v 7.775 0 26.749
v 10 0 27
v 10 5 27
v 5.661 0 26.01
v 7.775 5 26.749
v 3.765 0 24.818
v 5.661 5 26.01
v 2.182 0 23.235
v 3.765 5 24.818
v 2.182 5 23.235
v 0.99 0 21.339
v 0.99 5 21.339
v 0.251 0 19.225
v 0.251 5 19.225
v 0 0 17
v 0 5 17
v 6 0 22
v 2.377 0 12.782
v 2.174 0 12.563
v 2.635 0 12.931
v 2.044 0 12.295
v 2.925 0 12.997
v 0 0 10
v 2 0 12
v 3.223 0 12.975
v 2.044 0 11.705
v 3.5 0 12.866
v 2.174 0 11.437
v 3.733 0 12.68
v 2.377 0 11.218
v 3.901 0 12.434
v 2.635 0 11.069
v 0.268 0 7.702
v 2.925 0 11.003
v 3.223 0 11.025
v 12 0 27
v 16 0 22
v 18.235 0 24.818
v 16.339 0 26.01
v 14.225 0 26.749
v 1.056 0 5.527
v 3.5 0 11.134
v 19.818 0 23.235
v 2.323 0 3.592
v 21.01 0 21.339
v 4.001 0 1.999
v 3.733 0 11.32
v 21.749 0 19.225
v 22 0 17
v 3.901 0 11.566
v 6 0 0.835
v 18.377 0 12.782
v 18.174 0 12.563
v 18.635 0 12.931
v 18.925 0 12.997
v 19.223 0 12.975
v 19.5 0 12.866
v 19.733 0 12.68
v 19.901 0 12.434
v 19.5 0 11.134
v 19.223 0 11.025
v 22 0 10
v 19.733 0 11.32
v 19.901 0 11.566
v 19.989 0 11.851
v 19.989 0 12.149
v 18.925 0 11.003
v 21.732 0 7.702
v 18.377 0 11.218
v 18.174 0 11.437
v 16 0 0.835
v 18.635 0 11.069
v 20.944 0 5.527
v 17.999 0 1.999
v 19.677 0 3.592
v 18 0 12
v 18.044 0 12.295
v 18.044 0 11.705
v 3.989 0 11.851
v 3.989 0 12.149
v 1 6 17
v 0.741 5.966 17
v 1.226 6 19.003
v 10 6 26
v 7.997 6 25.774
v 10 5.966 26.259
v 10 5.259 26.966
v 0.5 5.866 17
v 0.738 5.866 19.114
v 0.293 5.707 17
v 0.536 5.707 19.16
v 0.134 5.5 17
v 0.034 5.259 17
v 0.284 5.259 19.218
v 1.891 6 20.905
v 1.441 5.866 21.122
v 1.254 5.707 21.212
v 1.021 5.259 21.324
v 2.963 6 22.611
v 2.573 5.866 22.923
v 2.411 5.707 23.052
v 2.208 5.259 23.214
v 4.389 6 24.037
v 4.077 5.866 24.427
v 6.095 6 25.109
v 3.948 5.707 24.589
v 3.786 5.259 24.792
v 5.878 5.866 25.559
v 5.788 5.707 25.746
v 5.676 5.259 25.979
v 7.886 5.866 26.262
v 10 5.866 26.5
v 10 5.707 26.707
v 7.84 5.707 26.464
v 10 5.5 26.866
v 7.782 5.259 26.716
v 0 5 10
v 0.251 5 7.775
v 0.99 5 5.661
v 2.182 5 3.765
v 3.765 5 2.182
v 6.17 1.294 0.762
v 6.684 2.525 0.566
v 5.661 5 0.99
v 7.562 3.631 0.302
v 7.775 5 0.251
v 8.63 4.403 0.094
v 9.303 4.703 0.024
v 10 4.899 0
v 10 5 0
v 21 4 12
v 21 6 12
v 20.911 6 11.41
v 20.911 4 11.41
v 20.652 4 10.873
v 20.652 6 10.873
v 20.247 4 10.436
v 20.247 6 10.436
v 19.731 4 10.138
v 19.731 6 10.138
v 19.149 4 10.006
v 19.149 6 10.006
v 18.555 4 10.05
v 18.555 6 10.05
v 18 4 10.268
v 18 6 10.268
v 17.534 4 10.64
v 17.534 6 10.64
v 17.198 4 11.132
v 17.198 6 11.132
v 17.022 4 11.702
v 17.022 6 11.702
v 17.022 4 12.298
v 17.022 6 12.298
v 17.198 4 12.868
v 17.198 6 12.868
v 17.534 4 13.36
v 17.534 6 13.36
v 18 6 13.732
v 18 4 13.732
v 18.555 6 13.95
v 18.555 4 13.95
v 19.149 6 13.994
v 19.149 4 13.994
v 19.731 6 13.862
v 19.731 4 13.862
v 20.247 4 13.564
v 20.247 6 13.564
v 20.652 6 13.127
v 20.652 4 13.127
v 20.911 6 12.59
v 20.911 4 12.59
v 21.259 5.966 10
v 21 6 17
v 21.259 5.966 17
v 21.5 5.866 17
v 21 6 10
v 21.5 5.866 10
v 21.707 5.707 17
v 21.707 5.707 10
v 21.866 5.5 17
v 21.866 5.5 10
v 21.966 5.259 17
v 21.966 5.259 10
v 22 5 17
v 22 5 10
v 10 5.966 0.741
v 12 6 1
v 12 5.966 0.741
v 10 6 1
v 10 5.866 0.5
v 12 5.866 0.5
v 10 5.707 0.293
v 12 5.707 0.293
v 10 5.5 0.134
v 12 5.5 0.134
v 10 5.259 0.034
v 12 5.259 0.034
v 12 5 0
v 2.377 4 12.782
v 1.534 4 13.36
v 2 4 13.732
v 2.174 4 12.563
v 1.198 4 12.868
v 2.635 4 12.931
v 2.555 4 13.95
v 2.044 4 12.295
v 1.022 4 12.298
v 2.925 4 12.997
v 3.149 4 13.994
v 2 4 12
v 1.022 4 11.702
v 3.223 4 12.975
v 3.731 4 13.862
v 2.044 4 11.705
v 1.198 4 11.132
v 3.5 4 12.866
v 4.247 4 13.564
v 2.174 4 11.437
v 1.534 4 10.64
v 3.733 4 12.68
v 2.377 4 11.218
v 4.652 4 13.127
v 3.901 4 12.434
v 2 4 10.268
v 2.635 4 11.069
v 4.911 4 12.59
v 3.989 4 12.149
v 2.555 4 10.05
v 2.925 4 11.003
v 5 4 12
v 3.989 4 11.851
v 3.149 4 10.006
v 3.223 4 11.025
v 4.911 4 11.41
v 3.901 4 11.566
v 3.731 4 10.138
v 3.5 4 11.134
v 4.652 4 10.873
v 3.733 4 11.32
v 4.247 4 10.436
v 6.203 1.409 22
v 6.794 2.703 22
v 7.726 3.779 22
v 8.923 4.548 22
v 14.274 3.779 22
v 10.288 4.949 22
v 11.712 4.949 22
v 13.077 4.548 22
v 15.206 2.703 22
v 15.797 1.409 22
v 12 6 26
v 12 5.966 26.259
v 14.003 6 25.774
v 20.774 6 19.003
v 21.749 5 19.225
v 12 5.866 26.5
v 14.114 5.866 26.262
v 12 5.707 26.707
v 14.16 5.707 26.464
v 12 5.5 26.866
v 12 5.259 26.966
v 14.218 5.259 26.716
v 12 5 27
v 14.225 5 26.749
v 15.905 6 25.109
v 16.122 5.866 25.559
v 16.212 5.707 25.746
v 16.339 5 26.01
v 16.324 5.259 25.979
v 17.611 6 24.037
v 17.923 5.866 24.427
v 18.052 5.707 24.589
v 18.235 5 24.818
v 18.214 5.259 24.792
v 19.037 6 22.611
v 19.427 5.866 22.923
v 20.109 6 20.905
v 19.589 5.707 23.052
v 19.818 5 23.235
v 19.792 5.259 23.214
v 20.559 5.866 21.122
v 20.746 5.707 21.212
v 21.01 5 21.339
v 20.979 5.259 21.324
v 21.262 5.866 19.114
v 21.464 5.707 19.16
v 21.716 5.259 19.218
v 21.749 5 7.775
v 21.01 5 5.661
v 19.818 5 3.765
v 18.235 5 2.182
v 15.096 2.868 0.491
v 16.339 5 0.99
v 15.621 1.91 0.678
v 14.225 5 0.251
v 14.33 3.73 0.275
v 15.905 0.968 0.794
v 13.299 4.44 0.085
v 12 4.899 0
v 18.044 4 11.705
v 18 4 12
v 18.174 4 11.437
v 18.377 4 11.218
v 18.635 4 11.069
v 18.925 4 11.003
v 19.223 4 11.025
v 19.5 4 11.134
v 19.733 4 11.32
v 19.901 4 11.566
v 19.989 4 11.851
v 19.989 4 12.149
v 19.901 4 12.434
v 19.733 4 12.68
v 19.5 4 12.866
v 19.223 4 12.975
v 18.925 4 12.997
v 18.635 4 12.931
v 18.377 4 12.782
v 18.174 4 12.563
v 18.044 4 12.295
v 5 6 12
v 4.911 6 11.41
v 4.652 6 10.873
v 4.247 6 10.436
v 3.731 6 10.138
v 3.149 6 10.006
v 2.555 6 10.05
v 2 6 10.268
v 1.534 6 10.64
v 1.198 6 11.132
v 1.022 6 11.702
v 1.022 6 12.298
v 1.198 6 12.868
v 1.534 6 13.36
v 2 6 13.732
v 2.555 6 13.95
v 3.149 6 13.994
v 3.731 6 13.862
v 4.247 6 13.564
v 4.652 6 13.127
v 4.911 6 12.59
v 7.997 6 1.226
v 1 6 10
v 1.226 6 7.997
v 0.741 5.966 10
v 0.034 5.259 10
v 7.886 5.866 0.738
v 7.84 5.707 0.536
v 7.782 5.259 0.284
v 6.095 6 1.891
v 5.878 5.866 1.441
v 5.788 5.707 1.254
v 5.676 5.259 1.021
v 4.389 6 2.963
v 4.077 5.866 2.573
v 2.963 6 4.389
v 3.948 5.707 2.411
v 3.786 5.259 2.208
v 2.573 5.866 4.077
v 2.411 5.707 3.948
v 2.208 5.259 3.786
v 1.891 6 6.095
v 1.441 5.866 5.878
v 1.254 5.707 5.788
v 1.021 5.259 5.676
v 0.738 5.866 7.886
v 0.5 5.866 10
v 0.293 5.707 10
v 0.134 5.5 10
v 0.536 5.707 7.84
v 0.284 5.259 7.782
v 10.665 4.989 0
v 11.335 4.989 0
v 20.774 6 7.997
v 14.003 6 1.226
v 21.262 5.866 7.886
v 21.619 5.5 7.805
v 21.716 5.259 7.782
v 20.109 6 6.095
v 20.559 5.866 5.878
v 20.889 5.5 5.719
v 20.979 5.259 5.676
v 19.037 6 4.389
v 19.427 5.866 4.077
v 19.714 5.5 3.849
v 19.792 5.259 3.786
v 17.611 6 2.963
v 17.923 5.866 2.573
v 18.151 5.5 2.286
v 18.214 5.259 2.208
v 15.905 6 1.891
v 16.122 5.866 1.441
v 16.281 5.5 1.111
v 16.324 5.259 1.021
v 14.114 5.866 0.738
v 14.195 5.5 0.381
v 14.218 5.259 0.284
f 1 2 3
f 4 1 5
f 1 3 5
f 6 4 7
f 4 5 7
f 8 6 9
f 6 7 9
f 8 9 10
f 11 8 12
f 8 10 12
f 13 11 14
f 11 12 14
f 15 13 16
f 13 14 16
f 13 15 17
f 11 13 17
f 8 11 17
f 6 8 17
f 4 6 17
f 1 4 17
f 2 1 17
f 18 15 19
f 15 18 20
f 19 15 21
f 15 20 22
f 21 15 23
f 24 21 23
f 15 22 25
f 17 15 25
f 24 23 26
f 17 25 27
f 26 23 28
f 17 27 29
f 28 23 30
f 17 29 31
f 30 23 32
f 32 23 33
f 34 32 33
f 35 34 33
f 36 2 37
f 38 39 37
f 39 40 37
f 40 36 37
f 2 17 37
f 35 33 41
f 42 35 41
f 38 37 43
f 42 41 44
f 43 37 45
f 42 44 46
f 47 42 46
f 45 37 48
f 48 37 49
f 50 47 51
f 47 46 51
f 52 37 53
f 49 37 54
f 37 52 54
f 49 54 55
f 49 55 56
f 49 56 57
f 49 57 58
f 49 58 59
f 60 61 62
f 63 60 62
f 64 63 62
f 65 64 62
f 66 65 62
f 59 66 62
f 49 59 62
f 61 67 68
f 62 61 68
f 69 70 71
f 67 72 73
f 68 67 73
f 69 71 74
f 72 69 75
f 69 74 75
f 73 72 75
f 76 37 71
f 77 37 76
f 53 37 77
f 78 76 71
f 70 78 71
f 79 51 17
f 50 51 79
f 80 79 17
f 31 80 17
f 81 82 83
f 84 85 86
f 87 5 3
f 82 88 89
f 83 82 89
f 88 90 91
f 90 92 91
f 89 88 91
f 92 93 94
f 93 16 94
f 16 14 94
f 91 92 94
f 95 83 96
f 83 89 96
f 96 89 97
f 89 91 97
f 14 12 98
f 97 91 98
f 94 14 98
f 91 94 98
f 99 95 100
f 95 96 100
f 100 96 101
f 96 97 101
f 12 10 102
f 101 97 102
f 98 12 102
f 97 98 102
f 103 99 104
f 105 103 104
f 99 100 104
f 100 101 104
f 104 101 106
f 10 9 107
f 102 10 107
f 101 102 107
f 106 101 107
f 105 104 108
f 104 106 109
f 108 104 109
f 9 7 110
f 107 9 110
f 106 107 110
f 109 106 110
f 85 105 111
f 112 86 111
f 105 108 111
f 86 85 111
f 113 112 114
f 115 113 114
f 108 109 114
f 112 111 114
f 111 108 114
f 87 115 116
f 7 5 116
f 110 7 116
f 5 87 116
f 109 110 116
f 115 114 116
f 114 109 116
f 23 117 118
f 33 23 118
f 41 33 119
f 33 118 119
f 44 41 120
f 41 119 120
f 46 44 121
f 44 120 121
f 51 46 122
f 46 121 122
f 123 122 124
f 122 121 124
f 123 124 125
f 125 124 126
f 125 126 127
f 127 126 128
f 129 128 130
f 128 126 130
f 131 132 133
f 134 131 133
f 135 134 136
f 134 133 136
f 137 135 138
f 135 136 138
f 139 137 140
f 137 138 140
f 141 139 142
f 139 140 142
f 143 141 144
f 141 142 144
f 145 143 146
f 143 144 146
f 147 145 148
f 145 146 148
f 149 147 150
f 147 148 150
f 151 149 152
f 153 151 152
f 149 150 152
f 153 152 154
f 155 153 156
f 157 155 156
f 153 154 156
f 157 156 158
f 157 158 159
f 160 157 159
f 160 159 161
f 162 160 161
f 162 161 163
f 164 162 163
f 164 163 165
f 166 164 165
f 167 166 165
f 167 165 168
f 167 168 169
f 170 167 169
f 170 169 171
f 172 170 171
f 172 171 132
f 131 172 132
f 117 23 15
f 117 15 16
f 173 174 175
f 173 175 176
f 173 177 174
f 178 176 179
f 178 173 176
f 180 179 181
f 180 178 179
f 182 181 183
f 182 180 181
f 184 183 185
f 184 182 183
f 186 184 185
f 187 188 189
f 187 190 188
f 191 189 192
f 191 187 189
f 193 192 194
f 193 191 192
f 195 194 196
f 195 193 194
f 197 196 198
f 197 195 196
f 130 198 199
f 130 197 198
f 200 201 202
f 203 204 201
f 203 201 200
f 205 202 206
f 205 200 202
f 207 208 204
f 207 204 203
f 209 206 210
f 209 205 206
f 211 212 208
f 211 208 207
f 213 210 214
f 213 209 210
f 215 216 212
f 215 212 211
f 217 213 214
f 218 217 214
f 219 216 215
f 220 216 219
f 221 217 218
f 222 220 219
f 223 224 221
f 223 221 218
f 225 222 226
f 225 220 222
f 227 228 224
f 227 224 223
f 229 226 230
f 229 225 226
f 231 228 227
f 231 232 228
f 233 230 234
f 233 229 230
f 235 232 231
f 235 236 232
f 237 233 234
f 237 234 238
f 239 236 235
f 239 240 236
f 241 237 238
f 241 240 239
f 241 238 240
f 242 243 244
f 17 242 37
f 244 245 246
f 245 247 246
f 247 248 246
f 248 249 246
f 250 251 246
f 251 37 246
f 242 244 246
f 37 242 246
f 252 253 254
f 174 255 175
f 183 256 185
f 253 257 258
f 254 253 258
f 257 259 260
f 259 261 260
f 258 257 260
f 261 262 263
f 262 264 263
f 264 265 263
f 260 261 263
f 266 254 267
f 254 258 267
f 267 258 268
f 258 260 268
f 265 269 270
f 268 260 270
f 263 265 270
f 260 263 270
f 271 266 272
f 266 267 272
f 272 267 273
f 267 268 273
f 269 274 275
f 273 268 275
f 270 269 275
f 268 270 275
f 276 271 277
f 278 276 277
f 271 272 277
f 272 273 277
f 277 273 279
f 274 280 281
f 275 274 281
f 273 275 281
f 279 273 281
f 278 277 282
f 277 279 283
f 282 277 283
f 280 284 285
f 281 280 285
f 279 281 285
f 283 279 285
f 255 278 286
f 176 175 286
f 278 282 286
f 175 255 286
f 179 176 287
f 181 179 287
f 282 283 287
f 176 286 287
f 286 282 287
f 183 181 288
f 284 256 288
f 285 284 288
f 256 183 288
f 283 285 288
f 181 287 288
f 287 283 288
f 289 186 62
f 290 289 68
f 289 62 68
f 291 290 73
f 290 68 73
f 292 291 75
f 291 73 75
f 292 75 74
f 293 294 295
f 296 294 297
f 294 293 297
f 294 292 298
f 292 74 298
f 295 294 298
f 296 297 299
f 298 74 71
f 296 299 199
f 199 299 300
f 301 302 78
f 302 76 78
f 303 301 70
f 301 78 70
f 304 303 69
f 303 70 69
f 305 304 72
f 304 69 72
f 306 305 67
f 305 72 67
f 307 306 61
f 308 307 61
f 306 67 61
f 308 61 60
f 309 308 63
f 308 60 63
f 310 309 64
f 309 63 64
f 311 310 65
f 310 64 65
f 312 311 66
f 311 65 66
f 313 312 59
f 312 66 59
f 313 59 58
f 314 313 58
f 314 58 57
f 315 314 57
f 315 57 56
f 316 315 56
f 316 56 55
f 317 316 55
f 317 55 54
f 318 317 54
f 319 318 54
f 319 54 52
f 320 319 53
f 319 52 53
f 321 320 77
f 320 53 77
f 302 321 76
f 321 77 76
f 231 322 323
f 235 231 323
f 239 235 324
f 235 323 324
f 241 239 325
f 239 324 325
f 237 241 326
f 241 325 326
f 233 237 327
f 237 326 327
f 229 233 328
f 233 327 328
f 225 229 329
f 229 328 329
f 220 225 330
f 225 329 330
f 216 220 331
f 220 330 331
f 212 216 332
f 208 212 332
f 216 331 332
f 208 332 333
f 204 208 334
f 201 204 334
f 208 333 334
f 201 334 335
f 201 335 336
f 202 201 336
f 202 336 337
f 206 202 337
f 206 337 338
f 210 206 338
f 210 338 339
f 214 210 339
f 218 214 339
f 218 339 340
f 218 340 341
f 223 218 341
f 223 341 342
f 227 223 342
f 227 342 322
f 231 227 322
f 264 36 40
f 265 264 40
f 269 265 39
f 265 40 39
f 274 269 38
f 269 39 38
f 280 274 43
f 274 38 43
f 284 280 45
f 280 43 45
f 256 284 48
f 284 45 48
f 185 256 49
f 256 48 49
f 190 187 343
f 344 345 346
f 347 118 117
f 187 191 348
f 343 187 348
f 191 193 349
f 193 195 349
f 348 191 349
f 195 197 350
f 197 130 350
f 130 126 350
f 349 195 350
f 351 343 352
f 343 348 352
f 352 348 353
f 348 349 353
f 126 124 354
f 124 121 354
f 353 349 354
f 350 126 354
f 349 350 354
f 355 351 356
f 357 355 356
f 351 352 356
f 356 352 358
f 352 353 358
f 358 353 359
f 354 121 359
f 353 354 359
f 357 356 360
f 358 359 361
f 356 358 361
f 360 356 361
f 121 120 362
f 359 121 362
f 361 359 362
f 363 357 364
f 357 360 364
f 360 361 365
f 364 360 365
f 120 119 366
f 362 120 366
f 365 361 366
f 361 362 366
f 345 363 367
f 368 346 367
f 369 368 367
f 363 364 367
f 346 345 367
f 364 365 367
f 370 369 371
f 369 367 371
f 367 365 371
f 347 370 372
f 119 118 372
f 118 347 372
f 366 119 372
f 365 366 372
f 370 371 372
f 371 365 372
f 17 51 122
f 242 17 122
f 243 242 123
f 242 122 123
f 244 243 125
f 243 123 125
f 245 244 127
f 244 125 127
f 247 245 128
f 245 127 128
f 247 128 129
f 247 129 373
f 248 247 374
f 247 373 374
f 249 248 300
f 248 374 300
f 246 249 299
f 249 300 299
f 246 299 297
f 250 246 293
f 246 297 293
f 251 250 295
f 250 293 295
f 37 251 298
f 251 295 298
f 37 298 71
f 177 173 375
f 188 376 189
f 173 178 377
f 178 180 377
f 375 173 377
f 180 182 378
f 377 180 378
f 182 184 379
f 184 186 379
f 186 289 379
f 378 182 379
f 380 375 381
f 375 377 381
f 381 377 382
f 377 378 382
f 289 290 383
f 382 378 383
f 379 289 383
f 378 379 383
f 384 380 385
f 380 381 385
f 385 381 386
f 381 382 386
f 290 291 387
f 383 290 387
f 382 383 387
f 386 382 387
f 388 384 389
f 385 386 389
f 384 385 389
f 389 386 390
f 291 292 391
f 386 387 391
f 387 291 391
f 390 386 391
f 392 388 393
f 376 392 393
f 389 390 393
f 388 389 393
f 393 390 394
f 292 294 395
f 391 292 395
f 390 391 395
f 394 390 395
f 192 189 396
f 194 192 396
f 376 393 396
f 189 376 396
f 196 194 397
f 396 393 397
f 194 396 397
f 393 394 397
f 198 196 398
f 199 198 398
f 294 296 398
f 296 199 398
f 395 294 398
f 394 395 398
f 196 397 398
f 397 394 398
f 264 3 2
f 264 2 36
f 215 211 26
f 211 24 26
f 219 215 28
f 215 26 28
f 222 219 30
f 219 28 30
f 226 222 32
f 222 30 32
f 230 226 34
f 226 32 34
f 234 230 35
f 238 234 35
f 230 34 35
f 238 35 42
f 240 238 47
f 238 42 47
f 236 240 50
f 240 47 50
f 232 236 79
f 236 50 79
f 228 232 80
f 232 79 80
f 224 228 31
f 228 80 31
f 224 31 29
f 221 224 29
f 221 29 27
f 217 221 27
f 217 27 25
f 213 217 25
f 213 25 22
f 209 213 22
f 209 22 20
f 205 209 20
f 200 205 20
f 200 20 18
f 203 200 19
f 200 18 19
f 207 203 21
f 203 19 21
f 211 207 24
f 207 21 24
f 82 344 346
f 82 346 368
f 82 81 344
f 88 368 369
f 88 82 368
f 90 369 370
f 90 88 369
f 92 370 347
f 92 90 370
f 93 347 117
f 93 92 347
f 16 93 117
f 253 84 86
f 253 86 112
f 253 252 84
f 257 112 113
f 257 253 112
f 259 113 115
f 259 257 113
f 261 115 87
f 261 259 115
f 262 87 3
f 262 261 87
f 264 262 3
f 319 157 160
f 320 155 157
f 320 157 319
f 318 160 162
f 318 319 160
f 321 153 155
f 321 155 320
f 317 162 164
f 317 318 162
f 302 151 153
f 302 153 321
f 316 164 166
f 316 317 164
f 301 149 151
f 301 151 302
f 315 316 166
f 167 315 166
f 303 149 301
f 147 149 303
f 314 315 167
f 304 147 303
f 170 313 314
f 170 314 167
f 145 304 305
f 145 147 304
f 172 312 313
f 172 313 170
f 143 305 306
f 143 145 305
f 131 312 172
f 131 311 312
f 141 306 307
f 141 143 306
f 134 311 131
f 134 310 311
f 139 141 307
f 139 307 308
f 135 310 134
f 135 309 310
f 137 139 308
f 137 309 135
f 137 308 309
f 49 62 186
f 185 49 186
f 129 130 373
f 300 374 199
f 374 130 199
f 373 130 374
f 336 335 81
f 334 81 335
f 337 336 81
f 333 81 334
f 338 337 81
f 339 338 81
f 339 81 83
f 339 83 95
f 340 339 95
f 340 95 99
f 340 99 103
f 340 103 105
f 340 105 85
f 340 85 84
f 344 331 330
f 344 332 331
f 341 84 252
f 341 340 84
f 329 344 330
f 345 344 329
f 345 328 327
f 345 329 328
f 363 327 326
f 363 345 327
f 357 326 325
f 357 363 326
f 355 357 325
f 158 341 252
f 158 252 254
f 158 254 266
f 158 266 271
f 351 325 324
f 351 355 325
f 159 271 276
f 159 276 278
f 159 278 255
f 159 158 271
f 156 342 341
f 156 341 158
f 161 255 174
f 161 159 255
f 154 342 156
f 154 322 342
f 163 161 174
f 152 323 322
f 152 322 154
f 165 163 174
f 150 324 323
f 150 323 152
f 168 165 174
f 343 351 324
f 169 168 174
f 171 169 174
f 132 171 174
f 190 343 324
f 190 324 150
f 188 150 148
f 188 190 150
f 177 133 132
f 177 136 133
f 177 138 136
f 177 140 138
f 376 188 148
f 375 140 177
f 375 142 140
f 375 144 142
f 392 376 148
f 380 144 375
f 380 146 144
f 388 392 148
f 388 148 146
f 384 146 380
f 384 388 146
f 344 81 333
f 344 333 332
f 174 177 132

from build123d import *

# Parameters (mm, degrees)
BOSS_EXTRU_1_DEPTH                                 = 22
ESQUISSE2_W                                        = 22
ESQUISSE2_H                                        = 6
BOSS_EXTRU_2_DEPTH                                 = 5
CHAMBRAGE_POUR_VIS_T_TE_HEXAGONALE_M21_D           = 2
CHAMBRAGE_POUR_VIS_T_TE_HEXAGONALE_M21_CBORE_D     = 4
CHAMBRAGE_POUR_VIS_T_TE_HEXAGONALE_M21_CBORE_DEPTH = 2
CONG_1_R                                           = 10
CONG_2_R                                           = 1


# Some blends are built 0.0001 mm under size
with BuildPart() as part:
    # Esquisse1 → Boss.-Extru.1 (new body)
    with BuildSketch(Plane.XY):
        with BuildLine():
            Line((0, 6), (0, 0))
            Line((0, 0), (6, 0))
            ThreePointArc((6, 0), (11, 5), (16, 0))
            Line((16, 0), (22, 0))
            Line((22, 0), (22, 6))
            Line((22, 6), (0, 6))
        make_face()
    extrude(amount=BOSS_EXTRU_1_DEPTH)

    # Esquisse2 → Boss.-Extru.2 (add)
    with BuildSketch(Plane.XY.offset(22)):
        with Locations((11, 3)):
            Rectangle(ESQUISSE2_W, ESQUISSE2_H)
    extrude(amount=BOSS_EXTRU_2_DEPTH)

    # Chambrage pour vis à tête hexagonale M21 (through all)
    with Locations(Plane(origin=(0, 6, 0), x_dir=(1, 0, 0), z_dir=(0, 1, 0))):
        with Locations((19, -12), (3, -12)):
            CounterBoreHole(CHAMBRAGE_POUR_VIS_T_TE_HEXAGONALE_M21_D / 2, CHAMBRAGE_POUR_VIS_T_TE_HEXAGONALE_M21_CBORE_D / 2, CHAMBRAGE_POUR_VIS_T_TE_HEXAGONALE_M21_CBORE_DEPTH)

    # Congé1
    # the kernel refuses this fillet: 10 mm, written as the material it takes off along each edge
    with BuildSketch(Plane(origin=(0, 31, 0), x_dir=(0, 0, 1), z_dir=(0, -1, 0)), Plane(origin=(22, -25, 27), x_dir=(-1, 0, 0), z_dir=(0, 1, 0))) as cong_1_piece_1:
        with BuildLine():
            CenterArc((CONG_1_R, -CONG_1_R), CONG_1_R, 90, 90)
            Line((0, -CONG_1_R), (0, 0))
            Line((0, 0), (CONG_1_R, 0))
        make_face()
    extrude(amount=56, mode=Mode.SUBTRACT)
    with BuildSketch(Plane(origin=(0, 31, 27), x_dir=(0, 0, -1), z_dir=(0, -1, 0)), Plane(origin=(22, -25, 0), x_dir=(-1, 0, 0), z_dir=(0, 1, 0))) as cong_1_piece_2:
        with BuildLine():
            CenterArc((CONG_1_R, CONG_1_R), CONG_1_R, 180, 90)
            Line((0, CONG_1_R), (0, 0))
            Line((0, 0), (CONG_1_R, 0))
        make_face()
    extrude(amount=56, mode=Mode.SUBTRACT)

    # Congé2
    cong_2_edges = [part.edges().sort_by_distance(p)[0] for p in [
        (11, 6, 0),
        (0, 6, 13.5),
        (11, 6, 27),
        (22, 6, 13.5),
        (19.071067812, 6, 24.071067812),
        (19.071067812, 6, 2.928932188),
        (2.928932188, 6, 24.071067812),
        (2.928932188, 6, 2.928932188),
    ]]
    fillet(cong_2_edges, radius=CONG_2_R - 0.0001)  # a hair under: the kernel refuses the full size


solid = part.part
